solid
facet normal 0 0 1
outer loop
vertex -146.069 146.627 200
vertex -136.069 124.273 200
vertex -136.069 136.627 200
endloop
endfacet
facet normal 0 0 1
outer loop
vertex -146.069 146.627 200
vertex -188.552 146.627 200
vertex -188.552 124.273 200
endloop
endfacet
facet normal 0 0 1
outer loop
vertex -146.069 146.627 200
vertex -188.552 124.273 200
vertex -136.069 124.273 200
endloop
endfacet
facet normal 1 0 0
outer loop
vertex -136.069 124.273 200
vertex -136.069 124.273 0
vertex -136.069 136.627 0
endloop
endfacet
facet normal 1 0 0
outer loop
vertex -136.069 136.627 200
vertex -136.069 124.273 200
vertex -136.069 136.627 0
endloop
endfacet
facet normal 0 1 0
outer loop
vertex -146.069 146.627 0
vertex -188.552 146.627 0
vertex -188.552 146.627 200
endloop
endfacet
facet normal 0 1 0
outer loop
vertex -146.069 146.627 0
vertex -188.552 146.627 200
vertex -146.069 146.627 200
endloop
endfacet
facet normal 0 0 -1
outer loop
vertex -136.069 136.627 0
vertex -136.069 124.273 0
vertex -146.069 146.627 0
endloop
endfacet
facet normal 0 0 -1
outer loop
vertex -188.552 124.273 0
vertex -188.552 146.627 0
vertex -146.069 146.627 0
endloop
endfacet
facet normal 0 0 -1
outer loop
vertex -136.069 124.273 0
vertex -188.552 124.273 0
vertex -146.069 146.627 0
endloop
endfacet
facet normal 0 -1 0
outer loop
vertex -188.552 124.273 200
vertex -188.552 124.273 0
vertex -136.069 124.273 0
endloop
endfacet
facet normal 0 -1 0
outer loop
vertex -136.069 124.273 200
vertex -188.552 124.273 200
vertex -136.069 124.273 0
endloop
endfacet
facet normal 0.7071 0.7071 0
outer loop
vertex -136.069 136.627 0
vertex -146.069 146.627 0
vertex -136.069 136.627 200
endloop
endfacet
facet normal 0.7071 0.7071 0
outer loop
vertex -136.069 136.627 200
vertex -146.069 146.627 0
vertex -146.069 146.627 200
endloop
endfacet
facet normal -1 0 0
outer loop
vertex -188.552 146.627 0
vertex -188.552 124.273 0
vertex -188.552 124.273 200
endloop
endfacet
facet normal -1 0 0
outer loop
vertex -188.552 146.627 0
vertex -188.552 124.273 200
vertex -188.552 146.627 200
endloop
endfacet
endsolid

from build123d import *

# Parameters (mm, degrees)
SKIZZE1_W                       = 52.482326825
SKIZZE1_H                       = 22.353583648
AUFSATZ_LINEAR_AUSTRAGEN1_DEPTH = 200
FASE1_SIZE                      = 10


with BuildPart() as part:
    # Skizze1 → Aufsatz-Linear austragen1 (new body)
    with BuildSketch(Plane.XY):
        with Locations((-162.31044063, 135.449774465)):
            Rectangle(SKIZZE1_W, SKIZZE1_H)
    extrude(amount=AUFSATZ_LINEAR_AUSTRAGEN1_DEPTH)

    # Fase1
    fase1_edges = [part.edges().sort_by_distance(p)[0] for p in [
        (-136.069277217, 146.626566289, 100),
    ]]
    chamfer(fase1_edges, length=FASE1_SIZE)


solid = part.part
